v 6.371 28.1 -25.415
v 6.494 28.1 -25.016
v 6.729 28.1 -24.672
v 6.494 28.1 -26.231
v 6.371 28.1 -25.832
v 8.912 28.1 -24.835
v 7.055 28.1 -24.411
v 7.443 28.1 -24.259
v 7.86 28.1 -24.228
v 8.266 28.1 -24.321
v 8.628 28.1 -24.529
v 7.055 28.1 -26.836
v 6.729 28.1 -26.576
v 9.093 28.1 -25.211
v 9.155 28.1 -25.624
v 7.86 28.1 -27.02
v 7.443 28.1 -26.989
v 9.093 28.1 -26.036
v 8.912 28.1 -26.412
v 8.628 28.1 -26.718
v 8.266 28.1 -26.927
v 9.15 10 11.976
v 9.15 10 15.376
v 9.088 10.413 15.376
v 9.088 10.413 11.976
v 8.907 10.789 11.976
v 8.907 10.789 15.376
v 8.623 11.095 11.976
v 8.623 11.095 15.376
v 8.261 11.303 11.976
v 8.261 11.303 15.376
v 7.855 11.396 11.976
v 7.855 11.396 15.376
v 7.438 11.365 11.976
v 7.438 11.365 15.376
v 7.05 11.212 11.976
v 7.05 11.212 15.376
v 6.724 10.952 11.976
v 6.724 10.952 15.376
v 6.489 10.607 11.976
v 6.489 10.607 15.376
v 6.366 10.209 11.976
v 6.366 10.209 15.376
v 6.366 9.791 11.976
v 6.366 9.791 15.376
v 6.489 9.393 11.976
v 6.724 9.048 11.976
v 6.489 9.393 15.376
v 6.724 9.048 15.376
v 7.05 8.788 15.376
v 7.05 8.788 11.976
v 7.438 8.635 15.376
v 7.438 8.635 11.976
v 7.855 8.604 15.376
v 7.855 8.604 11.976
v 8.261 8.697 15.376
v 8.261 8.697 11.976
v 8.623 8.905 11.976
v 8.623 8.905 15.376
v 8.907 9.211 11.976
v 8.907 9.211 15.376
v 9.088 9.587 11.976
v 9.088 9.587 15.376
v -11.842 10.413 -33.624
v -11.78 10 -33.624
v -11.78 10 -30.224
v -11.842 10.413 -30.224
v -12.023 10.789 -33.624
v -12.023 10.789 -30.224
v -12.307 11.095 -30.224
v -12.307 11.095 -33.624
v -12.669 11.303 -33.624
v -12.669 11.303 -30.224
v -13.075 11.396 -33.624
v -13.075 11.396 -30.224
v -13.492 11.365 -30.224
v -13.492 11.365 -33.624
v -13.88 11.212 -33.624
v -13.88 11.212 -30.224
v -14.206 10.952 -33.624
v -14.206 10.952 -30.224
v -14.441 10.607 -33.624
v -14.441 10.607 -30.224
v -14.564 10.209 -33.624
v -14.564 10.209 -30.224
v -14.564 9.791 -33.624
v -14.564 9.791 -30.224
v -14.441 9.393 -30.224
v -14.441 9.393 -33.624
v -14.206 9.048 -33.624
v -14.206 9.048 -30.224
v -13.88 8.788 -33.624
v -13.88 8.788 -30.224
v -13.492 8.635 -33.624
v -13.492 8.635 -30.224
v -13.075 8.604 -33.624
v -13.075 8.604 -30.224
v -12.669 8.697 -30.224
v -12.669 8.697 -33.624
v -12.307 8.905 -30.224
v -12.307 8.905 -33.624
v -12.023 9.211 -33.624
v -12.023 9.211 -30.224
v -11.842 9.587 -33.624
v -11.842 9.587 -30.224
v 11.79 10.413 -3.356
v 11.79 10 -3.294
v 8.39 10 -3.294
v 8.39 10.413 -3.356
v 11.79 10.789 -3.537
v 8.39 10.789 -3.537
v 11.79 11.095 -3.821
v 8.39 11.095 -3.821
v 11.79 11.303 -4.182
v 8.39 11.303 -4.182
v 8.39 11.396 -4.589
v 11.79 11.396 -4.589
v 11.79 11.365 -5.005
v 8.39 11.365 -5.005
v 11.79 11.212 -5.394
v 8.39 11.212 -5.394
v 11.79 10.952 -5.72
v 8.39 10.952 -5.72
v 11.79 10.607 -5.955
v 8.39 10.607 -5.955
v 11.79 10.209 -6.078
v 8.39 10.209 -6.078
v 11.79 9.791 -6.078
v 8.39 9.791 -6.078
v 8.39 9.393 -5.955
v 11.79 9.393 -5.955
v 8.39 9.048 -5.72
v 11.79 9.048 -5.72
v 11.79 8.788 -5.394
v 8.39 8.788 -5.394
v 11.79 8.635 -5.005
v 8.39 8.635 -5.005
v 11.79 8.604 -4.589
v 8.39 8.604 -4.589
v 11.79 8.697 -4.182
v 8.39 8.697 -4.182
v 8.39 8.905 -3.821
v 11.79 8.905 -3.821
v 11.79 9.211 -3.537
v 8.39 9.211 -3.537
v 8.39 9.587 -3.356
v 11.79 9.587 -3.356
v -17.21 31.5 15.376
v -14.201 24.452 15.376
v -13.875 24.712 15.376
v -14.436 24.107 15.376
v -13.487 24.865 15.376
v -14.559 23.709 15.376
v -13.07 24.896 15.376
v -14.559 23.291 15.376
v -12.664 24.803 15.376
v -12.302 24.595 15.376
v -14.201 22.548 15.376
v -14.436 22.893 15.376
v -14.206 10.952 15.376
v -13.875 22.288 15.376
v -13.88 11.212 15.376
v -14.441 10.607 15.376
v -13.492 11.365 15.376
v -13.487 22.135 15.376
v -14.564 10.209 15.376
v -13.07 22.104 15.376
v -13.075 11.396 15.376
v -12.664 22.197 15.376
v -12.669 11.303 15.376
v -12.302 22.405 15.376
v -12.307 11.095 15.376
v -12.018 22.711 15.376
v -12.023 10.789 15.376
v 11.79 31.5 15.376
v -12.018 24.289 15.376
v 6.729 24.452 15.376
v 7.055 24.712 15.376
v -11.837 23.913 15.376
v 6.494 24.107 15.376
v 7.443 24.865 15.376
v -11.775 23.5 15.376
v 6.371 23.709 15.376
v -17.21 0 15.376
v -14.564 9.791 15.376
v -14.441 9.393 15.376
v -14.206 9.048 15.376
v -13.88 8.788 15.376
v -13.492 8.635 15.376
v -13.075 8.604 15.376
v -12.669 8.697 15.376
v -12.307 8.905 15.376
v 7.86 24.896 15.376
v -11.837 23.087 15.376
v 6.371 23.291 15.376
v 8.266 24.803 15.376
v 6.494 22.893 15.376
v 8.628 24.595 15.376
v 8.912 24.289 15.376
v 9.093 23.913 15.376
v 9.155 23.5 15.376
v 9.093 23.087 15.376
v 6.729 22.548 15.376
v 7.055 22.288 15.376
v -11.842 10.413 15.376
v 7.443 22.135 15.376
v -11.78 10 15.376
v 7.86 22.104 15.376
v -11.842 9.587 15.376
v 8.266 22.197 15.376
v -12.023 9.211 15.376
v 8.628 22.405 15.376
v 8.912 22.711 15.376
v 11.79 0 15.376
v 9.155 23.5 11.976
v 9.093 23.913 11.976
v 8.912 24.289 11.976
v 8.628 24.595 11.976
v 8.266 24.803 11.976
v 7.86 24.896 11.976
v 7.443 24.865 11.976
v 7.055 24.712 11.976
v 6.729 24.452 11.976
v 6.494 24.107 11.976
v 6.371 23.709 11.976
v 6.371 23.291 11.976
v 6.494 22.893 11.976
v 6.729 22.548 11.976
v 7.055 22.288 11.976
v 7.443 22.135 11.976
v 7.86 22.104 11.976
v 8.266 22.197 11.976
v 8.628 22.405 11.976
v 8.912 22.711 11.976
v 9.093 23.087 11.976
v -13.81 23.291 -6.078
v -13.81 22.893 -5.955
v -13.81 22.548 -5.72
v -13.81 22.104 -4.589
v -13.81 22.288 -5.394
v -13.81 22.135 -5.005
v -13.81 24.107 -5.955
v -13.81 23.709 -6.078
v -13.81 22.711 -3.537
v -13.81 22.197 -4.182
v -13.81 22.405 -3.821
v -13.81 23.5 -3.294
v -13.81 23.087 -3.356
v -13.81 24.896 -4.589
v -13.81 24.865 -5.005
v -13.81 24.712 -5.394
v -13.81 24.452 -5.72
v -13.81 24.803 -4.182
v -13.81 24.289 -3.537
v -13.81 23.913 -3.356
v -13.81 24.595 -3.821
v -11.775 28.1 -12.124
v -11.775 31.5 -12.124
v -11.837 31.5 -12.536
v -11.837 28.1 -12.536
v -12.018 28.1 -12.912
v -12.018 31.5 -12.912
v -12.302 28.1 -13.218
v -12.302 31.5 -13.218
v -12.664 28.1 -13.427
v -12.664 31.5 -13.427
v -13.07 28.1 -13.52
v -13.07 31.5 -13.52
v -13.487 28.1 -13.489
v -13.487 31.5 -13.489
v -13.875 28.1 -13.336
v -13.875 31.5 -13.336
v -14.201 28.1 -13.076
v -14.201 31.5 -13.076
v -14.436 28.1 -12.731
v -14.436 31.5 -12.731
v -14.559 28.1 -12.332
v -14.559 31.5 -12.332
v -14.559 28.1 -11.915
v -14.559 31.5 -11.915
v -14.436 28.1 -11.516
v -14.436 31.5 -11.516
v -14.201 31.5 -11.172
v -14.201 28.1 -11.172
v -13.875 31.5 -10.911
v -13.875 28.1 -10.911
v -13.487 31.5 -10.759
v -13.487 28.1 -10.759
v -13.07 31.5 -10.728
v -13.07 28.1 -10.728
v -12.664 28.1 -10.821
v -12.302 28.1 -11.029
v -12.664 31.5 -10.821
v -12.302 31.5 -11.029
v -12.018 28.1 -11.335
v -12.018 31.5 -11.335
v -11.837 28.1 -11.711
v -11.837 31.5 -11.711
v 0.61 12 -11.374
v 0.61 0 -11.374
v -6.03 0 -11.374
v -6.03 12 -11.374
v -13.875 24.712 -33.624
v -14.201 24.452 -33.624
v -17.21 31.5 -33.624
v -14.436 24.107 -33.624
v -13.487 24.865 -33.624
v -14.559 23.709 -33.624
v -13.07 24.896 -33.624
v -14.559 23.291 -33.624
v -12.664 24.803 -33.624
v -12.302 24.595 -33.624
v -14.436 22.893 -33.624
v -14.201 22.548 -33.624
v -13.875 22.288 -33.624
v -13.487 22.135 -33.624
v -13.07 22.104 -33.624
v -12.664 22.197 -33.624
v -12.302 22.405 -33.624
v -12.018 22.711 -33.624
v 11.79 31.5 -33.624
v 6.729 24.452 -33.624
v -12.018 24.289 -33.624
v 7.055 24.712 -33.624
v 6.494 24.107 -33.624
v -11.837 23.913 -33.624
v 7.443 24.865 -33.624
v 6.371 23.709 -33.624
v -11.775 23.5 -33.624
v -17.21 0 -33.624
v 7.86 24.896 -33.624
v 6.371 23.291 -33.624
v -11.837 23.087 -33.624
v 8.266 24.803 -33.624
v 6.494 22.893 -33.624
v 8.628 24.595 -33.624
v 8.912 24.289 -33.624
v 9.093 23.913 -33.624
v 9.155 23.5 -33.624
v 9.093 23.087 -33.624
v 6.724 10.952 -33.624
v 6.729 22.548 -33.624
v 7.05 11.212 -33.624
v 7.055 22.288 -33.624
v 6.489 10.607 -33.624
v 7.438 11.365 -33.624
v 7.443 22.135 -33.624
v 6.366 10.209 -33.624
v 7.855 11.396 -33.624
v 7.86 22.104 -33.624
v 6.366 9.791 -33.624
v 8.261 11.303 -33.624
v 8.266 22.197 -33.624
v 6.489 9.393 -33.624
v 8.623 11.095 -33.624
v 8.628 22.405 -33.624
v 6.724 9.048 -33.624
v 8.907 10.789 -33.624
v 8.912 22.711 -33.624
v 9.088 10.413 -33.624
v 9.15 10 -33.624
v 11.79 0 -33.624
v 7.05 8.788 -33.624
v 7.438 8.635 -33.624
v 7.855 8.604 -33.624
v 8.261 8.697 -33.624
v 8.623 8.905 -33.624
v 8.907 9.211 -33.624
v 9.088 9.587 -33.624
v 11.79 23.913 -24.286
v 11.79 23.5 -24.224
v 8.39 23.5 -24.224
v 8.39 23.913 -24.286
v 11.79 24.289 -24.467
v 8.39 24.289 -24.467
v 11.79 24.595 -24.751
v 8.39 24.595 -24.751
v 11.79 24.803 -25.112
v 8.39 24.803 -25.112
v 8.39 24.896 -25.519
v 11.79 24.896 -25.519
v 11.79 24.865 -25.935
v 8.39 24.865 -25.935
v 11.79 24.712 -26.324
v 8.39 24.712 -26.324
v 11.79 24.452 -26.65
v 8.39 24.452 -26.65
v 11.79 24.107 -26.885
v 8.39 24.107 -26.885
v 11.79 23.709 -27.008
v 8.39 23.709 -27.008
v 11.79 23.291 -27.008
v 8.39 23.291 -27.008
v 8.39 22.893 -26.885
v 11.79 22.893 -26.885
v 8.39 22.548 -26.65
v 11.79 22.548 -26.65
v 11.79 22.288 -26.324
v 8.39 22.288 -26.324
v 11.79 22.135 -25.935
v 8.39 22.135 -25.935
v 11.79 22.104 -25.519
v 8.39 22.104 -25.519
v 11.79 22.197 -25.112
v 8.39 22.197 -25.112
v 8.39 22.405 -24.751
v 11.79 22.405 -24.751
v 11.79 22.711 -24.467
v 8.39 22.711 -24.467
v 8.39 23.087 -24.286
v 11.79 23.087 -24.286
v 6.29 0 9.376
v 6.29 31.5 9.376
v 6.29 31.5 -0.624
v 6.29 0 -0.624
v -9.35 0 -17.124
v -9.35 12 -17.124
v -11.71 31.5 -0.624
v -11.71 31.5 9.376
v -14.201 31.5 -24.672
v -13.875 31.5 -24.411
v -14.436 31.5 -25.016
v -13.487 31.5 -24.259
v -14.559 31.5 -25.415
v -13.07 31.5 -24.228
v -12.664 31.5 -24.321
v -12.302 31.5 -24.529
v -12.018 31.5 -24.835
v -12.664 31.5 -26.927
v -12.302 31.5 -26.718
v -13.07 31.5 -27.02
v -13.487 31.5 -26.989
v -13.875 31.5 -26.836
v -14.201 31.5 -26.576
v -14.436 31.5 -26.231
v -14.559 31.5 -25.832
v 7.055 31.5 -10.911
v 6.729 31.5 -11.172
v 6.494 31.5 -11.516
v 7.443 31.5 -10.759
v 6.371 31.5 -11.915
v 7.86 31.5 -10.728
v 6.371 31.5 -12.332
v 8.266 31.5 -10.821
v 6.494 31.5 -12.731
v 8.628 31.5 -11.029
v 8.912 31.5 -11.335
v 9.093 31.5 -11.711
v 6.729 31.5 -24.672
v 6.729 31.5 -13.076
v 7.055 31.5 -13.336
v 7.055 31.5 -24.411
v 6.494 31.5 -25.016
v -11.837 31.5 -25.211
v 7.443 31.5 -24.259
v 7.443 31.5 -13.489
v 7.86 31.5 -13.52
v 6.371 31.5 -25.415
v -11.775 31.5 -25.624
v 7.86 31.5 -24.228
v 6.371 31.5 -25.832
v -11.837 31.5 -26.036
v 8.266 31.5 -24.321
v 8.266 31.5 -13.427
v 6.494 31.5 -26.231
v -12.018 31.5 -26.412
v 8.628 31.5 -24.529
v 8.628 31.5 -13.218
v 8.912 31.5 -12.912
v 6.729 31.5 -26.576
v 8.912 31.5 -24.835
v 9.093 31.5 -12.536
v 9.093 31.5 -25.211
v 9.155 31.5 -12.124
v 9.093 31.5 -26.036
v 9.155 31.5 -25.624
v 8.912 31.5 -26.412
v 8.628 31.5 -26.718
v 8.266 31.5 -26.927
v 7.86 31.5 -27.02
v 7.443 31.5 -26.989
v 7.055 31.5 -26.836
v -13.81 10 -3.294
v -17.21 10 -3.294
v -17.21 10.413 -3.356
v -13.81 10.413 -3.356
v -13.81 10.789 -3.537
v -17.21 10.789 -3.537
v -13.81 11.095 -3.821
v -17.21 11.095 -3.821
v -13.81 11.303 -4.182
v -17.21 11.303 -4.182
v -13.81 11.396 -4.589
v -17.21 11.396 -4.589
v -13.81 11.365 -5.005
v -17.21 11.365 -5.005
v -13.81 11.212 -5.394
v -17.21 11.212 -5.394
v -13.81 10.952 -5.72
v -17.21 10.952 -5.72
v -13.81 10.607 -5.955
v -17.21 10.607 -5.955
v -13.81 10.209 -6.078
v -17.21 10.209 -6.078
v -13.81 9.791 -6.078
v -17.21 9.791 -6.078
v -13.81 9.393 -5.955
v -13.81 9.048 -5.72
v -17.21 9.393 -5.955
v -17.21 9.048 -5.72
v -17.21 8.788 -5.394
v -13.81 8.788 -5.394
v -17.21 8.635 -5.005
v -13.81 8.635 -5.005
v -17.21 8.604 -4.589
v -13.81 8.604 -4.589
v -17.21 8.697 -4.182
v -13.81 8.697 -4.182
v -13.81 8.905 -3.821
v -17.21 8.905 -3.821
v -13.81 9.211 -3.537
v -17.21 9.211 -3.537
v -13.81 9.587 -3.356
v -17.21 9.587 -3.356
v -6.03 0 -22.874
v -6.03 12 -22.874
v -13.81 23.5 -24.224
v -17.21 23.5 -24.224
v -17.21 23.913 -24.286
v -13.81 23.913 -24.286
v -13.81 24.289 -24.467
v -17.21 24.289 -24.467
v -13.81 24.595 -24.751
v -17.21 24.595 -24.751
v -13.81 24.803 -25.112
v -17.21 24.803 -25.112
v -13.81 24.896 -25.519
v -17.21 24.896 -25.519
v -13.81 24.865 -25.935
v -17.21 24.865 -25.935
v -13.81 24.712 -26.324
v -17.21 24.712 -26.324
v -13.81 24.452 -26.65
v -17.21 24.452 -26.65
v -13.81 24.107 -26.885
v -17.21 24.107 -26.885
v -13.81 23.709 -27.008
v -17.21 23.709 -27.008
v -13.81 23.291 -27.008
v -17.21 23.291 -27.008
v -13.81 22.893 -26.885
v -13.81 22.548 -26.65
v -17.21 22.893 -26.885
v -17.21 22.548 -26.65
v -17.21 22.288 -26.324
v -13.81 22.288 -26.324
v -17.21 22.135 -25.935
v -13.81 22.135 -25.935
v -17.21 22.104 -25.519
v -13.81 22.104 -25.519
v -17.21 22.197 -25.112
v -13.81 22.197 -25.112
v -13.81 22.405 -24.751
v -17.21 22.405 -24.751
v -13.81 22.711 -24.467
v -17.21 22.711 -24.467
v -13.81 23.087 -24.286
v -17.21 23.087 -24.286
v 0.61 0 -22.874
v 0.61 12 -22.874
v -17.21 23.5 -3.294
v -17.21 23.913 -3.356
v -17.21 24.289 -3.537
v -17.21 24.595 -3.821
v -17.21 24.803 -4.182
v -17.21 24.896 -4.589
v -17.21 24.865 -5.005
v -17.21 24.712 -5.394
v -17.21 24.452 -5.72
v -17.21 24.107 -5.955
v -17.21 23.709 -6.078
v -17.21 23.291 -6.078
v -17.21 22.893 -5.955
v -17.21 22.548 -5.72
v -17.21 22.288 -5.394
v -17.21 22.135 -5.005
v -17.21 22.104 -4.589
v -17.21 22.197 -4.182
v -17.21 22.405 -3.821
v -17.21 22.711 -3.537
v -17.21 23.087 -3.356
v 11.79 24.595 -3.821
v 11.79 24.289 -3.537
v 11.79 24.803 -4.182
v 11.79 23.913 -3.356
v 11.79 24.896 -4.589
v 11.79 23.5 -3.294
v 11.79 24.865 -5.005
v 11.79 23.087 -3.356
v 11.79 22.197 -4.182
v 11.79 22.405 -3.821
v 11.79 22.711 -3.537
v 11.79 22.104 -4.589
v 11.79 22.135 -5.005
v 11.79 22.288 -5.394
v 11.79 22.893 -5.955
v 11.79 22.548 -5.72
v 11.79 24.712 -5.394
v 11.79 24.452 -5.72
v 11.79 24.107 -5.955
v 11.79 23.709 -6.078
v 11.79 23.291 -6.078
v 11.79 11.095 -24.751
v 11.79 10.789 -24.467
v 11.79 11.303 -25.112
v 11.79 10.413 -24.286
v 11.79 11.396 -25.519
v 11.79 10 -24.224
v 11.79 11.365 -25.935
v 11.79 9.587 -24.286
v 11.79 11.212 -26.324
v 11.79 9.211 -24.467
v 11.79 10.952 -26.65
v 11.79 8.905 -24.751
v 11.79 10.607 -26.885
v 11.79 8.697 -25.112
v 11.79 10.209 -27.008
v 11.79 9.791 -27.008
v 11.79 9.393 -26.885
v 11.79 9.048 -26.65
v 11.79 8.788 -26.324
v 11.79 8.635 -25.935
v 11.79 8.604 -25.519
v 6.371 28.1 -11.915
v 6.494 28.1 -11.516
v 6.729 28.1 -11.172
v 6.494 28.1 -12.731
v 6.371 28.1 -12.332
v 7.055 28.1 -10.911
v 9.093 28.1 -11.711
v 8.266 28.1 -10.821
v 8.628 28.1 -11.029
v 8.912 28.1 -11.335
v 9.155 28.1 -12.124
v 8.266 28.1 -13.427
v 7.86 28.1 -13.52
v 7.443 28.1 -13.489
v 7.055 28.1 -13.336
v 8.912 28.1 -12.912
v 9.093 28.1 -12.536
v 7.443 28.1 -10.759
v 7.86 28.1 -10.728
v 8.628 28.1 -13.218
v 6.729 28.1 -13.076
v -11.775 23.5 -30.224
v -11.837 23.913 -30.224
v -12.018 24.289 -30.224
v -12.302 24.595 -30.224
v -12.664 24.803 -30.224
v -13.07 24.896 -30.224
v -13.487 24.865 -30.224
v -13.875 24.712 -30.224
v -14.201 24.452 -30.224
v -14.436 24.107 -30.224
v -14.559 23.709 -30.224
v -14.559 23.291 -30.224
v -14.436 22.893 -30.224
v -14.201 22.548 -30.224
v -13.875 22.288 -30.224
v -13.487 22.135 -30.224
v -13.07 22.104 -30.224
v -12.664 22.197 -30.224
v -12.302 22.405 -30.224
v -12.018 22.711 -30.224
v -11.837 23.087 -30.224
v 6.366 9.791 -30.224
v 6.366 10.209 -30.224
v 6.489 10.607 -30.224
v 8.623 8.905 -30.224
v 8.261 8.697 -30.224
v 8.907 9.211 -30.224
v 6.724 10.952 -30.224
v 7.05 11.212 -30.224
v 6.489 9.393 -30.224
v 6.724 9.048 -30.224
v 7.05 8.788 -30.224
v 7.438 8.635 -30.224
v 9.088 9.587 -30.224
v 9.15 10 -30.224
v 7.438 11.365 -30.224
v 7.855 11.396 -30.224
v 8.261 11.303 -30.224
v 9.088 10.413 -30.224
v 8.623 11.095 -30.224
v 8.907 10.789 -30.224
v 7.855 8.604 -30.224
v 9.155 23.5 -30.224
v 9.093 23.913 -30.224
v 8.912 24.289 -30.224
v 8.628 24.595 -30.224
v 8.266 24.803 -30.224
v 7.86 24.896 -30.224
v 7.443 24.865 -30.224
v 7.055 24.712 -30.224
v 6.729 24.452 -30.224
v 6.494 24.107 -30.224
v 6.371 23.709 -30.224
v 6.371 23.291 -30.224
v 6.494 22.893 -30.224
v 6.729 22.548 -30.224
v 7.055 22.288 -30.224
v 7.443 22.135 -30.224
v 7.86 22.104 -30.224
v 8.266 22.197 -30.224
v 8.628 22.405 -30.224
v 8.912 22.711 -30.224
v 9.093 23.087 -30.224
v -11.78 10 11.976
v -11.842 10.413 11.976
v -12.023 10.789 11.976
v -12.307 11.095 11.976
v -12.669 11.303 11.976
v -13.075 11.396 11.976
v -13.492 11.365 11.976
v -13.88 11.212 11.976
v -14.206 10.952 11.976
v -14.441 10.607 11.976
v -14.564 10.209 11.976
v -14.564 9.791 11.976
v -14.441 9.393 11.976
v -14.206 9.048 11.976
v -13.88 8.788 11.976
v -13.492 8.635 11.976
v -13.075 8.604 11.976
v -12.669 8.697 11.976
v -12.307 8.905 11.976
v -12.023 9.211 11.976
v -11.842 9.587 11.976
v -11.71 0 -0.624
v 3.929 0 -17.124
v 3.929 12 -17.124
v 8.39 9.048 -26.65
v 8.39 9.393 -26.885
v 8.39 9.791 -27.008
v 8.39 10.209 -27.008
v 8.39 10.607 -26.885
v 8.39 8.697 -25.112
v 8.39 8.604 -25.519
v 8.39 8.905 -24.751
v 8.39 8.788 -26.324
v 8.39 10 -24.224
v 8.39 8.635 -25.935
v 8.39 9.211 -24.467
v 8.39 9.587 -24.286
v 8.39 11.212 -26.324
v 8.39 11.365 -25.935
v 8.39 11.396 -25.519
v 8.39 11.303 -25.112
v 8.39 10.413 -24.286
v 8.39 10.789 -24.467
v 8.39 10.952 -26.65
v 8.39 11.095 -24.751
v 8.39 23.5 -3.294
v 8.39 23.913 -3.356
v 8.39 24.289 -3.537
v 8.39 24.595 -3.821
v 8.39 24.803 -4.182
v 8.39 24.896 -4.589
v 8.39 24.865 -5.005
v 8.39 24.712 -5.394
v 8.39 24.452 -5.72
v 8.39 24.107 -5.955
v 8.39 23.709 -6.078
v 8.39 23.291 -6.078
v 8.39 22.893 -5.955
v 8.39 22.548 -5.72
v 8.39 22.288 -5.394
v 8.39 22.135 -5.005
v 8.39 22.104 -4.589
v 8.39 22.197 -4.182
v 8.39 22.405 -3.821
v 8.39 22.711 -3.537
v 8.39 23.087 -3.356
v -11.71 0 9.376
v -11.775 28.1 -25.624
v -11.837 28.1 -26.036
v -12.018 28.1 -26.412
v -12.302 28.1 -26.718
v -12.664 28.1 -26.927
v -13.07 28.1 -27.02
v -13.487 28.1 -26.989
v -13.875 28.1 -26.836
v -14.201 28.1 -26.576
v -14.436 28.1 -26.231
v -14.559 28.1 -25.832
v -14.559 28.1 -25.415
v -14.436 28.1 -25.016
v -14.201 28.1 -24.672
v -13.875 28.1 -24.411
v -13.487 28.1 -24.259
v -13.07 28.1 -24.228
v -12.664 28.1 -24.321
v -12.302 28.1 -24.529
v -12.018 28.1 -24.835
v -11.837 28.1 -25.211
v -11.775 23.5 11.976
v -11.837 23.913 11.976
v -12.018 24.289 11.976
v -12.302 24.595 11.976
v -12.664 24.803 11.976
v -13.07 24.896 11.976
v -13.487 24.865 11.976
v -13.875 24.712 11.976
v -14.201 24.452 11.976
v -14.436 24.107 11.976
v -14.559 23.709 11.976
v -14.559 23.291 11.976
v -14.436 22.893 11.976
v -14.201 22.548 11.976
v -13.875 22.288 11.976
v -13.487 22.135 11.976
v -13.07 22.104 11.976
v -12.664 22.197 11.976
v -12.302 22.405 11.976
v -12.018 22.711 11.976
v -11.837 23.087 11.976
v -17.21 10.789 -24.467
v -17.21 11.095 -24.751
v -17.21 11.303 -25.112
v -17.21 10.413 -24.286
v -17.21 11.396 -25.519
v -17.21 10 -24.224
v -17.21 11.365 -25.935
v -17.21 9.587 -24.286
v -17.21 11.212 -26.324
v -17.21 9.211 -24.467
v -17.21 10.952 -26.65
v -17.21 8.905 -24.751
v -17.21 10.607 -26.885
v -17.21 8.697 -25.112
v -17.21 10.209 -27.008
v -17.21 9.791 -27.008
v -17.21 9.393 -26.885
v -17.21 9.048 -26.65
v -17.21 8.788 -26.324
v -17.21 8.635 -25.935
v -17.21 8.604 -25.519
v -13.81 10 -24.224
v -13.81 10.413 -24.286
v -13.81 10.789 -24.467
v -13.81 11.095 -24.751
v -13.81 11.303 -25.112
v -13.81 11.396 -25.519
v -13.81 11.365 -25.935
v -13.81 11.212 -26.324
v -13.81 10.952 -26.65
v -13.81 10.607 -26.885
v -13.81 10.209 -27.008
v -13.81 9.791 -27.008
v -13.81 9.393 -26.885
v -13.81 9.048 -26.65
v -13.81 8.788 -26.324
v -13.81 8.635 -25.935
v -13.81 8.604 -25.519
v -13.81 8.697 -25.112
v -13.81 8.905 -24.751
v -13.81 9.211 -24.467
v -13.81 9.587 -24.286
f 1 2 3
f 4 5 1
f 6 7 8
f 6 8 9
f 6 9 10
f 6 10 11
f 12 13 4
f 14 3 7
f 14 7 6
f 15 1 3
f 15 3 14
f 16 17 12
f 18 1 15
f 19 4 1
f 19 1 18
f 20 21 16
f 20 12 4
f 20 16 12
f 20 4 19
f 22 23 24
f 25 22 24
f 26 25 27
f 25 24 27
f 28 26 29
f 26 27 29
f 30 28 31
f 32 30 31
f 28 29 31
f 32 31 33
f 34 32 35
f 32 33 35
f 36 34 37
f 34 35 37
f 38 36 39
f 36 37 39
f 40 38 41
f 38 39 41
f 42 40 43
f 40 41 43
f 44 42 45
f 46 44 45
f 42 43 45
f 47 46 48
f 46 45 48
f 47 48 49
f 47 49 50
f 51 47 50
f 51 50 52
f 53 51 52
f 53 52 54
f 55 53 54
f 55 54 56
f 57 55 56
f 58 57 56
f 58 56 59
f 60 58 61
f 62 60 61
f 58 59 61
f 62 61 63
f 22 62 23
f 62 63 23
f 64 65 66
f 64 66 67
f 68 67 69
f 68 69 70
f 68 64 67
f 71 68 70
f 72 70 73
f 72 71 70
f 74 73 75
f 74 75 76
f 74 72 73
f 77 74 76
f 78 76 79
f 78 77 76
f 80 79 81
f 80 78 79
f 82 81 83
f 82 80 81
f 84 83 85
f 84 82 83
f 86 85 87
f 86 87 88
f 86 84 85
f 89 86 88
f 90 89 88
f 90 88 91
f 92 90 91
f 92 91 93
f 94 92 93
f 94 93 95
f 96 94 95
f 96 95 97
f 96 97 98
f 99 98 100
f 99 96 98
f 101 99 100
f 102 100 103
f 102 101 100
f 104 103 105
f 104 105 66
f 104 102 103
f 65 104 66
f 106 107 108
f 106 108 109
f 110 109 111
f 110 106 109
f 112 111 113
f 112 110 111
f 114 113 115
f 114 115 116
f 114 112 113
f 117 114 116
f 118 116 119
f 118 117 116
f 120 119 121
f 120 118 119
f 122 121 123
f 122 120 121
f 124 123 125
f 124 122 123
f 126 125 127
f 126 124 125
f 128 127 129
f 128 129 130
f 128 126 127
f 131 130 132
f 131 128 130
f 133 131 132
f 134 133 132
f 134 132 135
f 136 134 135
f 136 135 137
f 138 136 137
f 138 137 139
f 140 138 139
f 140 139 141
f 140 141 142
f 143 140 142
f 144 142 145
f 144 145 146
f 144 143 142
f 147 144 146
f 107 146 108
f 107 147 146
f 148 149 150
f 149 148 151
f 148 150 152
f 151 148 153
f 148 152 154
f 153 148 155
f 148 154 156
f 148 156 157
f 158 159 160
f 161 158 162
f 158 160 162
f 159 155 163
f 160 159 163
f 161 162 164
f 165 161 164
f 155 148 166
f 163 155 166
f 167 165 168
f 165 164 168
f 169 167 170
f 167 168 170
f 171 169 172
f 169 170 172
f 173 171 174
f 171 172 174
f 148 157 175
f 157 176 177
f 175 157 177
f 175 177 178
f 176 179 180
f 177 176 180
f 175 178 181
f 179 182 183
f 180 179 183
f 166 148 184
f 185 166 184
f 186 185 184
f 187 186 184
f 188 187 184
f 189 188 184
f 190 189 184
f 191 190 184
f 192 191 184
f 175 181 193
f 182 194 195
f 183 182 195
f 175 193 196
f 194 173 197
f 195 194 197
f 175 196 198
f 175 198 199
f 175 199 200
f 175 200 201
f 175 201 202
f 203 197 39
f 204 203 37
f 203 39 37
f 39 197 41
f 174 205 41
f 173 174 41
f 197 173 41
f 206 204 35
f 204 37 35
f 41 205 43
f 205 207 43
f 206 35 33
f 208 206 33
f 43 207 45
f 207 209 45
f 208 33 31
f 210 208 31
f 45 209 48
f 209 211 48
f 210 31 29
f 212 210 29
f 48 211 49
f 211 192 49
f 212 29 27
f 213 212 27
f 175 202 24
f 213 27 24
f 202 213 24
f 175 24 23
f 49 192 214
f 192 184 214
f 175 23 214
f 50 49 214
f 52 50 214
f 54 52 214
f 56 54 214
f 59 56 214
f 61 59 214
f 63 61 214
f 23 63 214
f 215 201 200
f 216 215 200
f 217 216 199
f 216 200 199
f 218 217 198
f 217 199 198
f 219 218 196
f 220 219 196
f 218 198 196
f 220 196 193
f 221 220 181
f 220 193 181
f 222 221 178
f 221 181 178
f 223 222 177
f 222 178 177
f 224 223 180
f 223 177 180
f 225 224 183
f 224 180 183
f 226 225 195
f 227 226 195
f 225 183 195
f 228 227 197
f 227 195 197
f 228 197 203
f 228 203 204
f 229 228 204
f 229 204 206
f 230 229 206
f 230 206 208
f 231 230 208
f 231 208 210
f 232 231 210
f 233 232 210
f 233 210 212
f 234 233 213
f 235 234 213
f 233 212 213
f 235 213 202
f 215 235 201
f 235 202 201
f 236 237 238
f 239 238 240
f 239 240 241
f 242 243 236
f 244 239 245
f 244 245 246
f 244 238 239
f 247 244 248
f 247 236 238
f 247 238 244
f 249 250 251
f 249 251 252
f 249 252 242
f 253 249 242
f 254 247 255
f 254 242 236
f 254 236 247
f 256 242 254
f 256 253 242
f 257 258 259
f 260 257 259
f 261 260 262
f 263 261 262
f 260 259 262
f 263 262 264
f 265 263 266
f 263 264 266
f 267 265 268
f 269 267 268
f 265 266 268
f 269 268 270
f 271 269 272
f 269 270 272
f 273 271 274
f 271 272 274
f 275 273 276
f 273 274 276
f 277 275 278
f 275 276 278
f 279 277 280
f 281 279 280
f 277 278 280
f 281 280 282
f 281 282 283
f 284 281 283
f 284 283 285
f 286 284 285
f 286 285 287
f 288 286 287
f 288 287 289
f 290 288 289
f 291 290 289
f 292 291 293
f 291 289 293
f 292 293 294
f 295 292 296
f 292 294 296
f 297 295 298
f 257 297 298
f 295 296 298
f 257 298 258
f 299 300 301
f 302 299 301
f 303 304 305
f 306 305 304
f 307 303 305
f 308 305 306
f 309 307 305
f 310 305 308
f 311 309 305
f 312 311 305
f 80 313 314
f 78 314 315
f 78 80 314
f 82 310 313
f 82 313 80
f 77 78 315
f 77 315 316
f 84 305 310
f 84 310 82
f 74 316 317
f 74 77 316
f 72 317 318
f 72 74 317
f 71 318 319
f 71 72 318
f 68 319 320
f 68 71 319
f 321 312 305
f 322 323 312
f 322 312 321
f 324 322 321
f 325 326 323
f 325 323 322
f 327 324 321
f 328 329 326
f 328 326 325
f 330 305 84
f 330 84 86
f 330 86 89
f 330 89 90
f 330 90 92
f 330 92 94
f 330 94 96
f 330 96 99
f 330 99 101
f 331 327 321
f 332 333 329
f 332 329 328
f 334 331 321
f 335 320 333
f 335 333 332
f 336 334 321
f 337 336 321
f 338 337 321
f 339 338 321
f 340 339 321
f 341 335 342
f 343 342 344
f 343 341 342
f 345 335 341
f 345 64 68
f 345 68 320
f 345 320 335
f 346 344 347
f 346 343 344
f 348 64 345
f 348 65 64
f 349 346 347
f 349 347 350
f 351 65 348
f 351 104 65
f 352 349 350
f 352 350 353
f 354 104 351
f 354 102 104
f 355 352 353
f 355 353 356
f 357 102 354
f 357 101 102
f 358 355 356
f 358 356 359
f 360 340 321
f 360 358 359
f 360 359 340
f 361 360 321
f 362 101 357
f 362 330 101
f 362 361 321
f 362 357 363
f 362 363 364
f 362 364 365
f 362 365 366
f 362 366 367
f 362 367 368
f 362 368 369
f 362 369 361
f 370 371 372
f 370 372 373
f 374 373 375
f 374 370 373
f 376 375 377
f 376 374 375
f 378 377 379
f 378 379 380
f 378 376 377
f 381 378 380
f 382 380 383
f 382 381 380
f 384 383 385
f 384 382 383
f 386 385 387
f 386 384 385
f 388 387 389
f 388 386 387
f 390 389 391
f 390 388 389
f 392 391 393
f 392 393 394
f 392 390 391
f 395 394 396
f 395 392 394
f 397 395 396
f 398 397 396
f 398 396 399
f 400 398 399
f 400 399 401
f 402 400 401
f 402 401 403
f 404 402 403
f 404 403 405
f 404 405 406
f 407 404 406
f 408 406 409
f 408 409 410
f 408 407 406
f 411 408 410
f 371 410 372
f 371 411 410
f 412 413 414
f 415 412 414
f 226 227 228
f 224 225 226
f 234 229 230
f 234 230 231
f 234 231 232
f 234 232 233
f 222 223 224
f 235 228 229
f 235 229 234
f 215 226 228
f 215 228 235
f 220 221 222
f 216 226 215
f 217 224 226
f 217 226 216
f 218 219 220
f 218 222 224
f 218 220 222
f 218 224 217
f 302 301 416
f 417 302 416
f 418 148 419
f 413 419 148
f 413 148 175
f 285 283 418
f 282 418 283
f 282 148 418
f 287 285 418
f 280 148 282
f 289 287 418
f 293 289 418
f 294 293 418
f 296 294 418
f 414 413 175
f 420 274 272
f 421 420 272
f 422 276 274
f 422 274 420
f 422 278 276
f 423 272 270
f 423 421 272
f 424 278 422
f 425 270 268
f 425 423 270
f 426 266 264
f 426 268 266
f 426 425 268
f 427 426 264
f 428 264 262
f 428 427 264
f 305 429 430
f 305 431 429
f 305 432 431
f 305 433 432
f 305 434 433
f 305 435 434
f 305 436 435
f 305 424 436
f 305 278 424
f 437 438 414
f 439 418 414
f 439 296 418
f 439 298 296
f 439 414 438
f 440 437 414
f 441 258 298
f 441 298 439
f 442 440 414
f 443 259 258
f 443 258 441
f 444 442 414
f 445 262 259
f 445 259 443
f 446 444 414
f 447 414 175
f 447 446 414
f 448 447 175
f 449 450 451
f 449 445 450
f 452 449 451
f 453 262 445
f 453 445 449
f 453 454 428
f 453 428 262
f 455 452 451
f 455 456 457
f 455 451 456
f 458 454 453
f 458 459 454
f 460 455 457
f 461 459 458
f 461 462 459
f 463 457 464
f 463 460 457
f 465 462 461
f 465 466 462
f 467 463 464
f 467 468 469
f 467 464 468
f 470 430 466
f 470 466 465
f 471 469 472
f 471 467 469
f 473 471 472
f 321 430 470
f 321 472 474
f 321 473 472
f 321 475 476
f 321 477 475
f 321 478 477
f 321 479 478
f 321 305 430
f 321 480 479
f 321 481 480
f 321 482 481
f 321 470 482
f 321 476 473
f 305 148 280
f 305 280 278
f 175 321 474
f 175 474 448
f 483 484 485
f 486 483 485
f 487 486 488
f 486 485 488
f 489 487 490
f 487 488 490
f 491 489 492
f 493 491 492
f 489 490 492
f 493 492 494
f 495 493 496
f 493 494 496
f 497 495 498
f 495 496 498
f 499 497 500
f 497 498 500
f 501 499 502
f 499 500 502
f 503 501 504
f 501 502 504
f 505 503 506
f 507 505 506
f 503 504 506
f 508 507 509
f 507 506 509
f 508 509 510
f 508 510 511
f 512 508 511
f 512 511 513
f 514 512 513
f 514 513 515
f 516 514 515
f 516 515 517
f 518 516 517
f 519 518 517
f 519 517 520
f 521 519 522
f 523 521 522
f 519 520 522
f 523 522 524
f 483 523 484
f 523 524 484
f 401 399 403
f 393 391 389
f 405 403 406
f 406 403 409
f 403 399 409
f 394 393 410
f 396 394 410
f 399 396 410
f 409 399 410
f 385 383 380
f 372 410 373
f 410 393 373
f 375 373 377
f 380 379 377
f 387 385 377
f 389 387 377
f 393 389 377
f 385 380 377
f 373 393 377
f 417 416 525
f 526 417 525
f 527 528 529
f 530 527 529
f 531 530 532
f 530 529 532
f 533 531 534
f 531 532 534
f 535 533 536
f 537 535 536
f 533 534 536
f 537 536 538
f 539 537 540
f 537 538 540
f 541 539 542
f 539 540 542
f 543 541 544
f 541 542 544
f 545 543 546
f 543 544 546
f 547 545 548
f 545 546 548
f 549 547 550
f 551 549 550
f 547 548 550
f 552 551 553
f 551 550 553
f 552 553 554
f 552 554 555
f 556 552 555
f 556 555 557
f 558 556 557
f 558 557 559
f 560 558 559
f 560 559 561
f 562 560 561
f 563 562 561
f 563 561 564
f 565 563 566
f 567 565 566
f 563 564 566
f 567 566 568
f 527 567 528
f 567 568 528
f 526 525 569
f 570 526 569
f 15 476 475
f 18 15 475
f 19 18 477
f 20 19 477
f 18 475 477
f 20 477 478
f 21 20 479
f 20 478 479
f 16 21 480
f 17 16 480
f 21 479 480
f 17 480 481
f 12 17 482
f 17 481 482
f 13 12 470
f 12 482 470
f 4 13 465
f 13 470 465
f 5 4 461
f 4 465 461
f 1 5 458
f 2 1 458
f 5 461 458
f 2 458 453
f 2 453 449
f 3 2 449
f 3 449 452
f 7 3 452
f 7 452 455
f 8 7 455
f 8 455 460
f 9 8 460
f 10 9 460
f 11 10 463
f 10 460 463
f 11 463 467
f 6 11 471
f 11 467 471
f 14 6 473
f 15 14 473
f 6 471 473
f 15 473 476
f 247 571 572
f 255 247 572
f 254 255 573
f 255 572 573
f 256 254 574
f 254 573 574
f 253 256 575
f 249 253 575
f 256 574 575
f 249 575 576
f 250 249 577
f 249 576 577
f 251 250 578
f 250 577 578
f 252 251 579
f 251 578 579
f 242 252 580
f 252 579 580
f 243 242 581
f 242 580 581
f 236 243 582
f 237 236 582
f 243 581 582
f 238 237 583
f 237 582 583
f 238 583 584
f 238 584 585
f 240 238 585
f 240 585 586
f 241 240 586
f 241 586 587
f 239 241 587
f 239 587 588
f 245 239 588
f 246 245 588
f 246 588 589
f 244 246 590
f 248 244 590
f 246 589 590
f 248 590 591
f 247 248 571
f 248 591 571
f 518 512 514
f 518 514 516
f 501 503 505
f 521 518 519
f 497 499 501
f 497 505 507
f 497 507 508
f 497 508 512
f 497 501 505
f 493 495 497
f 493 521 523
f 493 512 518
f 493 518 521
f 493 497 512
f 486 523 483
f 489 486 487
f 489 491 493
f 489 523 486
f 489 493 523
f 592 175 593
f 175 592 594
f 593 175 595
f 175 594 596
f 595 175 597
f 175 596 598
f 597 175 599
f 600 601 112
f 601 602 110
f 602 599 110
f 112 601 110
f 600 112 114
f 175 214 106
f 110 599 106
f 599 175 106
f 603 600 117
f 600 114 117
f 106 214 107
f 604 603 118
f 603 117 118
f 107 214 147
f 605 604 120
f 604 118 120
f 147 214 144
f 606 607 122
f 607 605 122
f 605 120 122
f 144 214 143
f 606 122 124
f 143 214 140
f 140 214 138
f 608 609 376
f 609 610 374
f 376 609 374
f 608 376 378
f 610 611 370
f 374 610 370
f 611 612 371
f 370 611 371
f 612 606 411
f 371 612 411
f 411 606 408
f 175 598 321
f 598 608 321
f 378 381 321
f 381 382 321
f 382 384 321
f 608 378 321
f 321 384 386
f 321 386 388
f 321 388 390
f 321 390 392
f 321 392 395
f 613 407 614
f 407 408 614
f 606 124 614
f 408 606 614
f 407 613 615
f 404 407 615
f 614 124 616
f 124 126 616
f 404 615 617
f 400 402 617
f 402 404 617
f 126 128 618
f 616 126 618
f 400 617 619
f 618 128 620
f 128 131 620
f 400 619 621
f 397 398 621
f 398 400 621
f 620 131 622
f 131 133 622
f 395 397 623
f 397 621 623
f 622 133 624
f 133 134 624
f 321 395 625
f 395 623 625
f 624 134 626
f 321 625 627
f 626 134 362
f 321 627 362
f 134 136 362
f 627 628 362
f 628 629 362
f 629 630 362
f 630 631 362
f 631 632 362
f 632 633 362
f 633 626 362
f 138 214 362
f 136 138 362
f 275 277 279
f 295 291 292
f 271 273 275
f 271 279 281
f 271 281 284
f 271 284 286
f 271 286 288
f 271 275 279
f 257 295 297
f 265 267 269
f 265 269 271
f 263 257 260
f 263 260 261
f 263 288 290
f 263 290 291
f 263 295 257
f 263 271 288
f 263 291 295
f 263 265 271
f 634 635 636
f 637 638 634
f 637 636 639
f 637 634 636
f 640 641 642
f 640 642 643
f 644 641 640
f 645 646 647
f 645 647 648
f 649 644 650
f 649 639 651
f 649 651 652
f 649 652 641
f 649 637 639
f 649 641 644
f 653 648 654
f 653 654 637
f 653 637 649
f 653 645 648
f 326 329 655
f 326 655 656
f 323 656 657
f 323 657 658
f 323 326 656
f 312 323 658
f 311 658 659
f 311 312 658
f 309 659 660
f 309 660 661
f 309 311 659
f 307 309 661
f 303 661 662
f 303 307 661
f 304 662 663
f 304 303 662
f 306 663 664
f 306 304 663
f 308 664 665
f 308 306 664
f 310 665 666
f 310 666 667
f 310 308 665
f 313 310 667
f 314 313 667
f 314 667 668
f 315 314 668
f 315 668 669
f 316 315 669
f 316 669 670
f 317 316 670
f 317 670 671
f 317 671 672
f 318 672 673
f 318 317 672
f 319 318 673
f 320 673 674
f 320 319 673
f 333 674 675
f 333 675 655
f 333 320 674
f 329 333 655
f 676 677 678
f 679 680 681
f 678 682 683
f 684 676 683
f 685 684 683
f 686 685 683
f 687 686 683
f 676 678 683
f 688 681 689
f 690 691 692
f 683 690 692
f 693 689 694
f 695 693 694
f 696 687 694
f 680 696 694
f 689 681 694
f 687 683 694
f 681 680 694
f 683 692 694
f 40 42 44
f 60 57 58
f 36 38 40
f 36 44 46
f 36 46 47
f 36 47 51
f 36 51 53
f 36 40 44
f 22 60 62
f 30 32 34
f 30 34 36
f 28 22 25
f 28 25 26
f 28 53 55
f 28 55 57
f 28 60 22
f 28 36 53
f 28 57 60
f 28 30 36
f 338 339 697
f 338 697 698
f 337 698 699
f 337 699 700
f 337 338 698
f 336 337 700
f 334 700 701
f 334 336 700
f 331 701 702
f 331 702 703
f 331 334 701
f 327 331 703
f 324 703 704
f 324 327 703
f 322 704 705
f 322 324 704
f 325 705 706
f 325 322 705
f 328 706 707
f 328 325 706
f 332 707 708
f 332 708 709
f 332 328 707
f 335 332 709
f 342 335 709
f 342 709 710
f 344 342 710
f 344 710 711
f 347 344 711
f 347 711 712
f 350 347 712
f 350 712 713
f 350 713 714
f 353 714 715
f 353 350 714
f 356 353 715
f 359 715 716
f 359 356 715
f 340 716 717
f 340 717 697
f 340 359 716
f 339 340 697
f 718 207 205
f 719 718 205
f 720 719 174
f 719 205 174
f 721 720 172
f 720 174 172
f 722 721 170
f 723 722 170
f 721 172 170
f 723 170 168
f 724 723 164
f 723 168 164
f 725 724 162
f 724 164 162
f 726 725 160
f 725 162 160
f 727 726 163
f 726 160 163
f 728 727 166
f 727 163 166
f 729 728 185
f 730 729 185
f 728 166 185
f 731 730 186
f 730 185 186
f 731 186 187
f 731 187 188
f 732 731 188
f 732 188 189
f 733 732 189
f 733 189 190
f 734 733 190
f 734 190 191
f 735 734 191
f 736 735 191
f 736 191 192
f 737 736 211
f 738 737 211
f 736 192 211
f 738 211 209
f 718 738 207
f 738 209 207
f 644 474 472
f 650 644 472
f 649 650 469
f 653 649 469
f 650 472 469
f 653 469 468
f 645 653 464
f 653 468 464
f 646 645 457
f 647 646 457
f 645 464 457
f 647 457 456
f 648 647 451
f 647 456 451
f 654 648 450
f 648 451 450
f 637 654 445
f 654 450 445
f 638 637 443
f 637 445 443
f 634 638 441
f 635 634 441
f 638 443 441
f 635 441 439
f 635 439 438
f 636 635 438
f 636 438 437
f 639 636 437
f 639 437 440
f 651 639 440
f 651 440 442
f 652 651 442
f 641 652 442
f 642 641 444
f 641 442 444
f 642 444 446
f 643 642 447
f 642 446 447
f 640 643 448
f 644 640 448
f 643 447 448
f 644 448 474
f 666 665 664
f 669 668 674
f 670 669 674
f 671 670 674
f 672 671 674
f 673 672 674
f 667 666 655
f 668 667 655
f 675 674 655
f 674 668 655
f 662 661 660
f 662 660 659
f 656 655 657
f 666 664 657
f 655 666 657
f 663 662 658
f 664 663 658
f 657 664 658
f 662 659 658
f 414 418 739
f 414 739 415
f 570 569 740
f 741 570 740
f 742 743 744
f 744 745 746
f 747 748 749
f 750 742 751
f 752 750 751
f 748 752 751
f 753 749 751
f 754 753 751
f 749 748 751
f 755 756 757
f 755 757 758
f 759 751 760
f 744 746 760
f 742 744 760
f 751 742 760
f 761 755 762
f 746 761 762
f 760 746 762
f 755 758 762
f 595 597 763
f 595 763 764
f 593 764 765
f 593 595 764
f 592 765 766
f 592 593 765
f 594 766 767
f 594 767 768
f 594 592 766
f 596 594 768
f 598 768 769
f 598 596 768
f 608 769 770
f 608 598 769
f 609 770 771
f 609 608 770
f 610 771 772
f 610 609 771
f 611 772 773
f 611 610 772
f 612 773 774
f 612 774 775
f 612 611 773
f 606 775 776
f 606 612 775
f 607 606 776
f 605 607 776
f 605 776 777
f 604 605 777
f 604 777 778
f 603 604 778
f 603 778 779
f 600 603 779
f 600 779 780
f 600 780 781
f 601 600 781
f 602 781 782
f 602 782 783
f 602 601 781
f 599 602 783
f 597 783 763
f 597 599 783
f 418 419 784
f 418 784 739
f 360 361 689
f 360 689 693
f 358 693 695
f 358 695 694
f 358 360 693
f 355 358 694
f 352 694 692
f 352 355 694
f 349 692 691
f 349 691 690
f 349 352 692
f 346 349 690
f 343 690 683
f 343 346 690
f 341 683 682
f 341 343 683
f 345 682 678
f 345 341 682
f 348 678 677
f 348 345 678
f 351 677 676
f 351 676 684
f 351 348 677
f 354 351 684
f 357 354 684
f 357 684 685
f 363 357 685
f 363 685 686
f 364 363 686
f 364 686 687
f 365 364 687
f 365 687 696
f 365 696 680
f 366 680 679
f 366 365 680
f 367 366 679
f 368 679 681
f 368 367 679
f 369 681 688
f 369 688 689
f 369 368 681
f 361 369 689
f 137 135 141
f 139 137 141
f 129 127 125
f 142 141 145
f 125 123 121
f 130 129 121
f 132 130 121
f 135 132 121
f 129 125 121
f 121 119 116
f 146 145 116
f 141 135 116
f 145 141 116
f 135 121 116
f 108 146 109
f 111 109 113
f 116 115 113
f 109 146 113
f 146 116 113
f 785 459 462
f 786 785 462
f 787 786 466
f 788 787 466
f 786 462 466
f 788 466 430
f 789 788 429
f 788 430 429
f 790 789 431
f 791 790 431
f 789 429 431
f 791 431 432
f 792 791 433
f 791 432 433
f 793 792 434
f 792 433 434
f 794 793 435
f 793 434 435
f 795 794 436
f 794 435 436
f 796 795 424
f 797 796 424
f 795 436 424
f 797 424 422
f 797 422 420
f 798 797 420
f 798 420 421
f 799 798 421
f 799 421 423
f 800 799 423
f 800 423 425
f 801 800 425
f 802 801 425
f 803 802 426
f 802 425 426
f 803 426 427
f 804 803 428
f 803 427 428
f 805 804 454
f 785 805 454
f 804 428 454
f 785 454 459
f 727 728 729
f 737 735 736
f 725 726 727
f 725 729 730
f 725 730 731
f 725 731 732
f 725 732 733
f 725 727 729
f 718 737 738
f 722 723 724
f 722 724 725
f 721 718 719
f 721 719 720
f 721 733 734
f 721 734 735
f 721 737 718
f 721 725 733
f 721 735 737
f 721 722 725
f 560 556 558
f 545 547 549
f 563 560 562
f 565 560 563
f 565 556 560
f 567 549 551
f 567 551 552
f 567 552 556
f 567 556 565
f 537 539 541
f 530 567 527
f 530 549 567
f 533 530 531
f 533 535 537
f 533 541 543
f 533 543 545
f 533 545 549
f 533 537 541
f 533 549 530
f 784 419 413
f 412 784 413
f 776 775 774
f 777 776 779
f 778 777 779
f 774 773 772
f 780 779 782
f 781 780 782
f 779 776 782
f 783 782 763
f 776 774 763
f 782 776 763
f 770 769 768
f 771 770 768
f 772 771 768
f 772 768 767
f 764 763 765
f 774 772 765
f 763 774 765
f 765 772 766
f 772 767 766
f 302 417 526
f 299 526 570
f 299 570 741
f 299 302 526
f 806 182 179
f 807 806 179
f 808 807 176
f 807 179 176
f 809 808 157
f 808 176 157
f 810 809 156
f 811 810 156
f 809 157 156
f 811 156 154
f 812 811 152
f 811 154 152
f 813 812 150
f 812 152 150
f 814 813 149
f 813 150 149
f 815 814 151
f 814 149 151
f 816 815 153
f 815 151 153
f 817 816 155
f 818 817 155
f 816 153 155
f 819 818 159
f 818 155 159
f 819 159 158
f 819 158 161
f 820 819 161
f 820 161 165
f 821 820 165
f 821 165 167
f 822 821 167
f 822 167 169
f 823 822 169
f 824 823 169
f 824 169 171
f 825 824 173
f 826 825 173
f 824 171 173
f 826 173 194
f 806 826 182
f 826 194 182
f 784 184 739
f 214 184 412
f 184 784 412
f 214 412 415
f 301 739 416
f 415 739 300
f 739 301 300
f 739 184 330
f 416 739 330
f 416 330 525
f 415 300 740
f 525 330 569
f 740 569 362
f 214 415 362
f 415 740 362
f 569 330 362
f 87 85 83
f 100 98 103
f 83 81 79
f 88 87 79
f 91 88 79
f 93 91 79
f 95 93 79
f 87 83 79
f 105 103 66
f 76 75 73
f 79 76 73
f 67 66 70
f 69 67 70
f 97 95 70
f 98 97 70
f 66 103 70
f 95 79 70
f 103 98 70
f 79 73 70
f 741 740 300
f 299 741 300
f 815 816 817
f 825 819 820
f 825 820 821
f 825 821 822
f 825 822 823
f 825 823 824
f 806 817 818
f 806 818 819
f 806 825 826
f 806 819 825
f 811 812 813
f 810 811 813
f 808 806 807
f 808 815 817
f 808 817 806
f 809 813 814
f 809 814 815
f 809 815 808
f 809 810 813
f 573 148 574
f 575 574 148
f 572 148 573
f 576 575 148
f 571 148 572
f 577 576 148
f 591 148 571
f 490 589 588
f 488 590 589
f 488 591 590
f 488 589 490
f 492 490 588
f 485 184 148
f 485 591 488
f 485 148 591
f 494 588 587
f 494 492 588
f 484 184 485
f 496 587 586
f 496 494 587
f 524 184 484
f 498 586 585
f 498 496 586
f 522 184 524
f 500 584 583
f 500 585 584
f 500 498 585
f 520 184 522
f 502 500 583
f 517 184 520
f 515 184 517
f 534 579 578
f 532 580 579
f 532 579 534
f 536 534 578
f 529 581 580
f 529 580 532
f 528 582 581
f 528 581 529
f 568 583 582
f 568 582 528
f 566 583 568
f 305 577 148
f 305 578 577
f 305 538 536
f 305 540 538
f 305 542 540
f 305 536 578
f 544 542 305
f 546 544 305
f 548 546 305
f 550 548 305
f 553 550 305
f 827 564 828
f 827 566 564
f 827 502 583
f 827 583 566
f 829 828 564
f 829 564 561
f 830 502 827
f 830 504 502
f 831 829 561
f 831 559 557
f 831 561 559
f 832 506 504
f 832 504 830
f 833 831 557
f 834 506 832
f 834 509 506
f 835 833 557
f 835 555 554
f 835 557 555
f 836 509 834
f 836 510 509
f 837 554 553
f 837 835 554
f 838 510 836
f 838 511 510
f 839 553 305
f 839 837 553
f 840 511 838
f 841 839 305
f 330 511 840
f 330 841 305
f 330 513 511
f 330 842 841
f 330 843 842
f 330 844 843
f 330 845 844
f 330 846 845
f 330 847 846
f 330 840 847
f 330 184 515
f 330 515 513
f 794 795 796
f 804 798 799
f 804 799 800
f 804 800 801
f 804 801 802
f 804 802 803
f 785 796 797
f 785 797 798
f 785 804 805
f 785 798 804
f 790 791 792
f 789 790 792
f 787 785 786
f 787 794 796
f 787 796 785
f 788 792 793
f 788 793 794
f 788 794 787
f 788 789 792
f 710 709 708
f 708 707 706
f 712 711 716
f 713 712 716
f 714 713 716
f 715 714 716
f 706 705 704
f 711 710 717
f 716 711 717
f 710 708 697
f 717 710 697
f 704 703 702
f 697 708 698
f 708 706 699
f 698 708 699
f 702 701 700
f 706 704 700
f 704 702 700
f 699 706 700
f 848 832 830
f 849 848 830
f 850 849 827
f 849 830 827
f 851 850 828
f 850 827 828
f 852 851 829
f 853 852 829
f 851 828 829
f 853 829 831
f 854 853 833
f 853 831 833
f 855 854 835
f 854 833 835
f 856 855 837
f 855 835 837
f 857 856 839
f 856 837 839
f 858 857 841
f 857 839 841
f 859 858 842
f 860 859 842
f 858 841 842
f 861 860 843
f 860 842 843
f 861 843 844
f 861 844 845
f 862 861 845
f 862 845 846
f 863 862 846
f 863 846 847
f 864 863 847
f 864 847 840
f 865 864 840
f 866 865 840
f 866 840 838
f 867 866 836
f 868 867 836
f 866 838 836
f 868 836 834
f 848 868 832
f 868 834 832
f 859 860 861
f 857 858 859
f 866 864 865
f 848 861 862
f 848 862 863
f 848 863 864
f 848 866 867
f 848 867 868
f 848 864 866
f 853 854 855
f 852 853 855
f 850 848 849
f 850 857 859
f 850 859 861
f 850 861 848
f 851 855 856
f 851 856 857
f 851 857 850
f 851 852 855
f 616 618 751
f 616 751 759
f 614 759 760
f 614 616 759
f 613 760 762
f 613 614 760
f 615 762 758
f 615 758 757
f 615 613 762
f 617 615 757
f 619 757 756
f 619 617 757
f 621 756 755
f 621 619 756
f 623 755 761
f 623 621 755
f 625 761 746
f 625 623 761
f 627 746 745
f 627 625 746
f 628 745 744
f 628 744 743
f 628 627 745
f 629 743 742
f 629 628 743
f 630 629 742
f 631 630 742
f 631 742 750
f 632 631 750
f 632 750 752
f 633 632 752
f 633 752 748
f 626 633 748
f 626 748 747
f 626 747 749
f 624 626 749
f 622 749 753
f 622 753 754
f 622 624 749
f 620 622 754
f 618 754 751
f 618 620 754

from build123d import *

# Parameters (mm, degrees)
SKETCH1_W           = 29
SKETCH1_H           = 49
BOSS_EXTRUDE1_DEPTH = 31.5
SKETCH2_W           = 18
SKETCH2_H           = 10
CUT_EXTRUDE1_DEPTH  = 32.5
SKETCH3_R           = 1.4
CUT_EXTRUDE2_DEPTH  = 3.4
SKETCH4_R           = 1.4
CUT_EXTRUDE3_DEPTH  = 3.4
SKETCH5_R           = 1.4
CUT_EXTRUDE4_DEPTH  = 3.4
CUT_EXTRUDE5_DEPTH  = 12


with BuildPart() as part:
    # Sketch1 → Boss-Extrude1 (new body)
    with BuildSketch(Plane(origin=(0, 0, 0), x_dir=(1, 0, 0), z_dir=(0, 1, 0))):
        with Locations((-2.710031348, 9.123824451)):
            Rectangle(SKETCH1_W, SKETCH1_H)
    extrude(amount=BOSS_EXTRUDE1_DEPTH)

    # Sketch2 → Cut-Extrude1 (cut, through all)
    with BuildSketch(Plane(origin=(0, 31.5, 0), x_dir=(1, 0, 0), z_dir=(0, 1, 0))):
        with Locations((-2.710031348, -4.376175549)):
            Rectangle(SKETCH2_W, SKETCH2_H)
    extrude(amount=-CUT_EXTRUDE1_DEPTH, mode=Mode.SUBTRACT)

    # Sketch3 → Cut-Extrude2 (cut)
    with BuildSketch(Plane(origin=(0, 31.5, 0), x_dir=(1, 0, 0), z_dir=(0, 1, 0))):
        with Locations((-13.175031348, 25.623824451)):
            Circle(SKETCH3_R)
        with Locations((-13.175031348, 12.123824451)):
            Circle(SKETCH3_R)
        with Locations((7.754968652, 25.623824451)):
            Circle(SKETCH3_R)
        with Locations((7.754968652, 12.123824451)):
            Circle(SKETCH3_R)
    extrude(amount=-CUT_EXTRUDE2_DEPTH, mode=Mode.SUBTRACT)

    # Sketch4 → Cut-Extrude3 (cut)
    with BuildSketch(Plane.ZY.offset(17.210031348)):
        with Locations((-25.623824451, 23.5)):
            Circle(SKETCH4_R)
        with Locations((-4.693824451, 23.5)):
            Circle(SKETCH4_R)
        with Locations((-25.623824451, 10)):
            Circle(SKETCH4_R)
        with Locations((-4.693824451, 10)):
            Circle(SKETCH4_R)
    cut_extrude3 = extrude(amount=-CUT_EXTRUDE3_DEPTH, mode=Mode.SUBTRACT)

    # Mirror1: Cut-Extrude3 across plane
    add(cut_extrude3.mirror(Plane.ZY.offset(2.710031348)), mode=Mode.SUBTRACT)

    # Sketch5 → Cut-Extrude4 (cut)
    with BuildSketch(Plane.XY.offset(15.376175549)):
        with Locations((-13.175031348, 23.5)):
            Circle(SKETCH5_R)
        with Locations((7.754968652, 23.5)):
            Circle(SKETCH5_R)
        with Locations((-13.180031348, 10)):
            Circle(SKETCH5_R)
        with Locations((7.749968652, 10)):
            Circle(SKETCH5_R)
    cut_extrude4 = extrude(amount=-CUT_EXTRUDE4_DEPTH, mode=Mode.SUBTRACT)

    # Mirror2: Cut-Extrude4 across plane
    add(cut_extrude4.mirror(Plane.XY.offset(-9.123824451)), mode=Mode.SUBTRACT)

    # Sketch7 → Cut-Extrude5 (cut)
    with BuildSketch(Plane.XZ):
        Polygon((3.929496748, -17.123824451), (0.6097327, -11.373824451), (-6.029795396, -11.373824451), (-9.349559444, -17.123824451), (-6.029795396, -22.873824451), (0.6097327, -22.873824451), align=None)
    extrude(amount=-CUT_EXTRUDE5_DEPTH, mode=Mode.SUBTRACT)


solid = part.part
